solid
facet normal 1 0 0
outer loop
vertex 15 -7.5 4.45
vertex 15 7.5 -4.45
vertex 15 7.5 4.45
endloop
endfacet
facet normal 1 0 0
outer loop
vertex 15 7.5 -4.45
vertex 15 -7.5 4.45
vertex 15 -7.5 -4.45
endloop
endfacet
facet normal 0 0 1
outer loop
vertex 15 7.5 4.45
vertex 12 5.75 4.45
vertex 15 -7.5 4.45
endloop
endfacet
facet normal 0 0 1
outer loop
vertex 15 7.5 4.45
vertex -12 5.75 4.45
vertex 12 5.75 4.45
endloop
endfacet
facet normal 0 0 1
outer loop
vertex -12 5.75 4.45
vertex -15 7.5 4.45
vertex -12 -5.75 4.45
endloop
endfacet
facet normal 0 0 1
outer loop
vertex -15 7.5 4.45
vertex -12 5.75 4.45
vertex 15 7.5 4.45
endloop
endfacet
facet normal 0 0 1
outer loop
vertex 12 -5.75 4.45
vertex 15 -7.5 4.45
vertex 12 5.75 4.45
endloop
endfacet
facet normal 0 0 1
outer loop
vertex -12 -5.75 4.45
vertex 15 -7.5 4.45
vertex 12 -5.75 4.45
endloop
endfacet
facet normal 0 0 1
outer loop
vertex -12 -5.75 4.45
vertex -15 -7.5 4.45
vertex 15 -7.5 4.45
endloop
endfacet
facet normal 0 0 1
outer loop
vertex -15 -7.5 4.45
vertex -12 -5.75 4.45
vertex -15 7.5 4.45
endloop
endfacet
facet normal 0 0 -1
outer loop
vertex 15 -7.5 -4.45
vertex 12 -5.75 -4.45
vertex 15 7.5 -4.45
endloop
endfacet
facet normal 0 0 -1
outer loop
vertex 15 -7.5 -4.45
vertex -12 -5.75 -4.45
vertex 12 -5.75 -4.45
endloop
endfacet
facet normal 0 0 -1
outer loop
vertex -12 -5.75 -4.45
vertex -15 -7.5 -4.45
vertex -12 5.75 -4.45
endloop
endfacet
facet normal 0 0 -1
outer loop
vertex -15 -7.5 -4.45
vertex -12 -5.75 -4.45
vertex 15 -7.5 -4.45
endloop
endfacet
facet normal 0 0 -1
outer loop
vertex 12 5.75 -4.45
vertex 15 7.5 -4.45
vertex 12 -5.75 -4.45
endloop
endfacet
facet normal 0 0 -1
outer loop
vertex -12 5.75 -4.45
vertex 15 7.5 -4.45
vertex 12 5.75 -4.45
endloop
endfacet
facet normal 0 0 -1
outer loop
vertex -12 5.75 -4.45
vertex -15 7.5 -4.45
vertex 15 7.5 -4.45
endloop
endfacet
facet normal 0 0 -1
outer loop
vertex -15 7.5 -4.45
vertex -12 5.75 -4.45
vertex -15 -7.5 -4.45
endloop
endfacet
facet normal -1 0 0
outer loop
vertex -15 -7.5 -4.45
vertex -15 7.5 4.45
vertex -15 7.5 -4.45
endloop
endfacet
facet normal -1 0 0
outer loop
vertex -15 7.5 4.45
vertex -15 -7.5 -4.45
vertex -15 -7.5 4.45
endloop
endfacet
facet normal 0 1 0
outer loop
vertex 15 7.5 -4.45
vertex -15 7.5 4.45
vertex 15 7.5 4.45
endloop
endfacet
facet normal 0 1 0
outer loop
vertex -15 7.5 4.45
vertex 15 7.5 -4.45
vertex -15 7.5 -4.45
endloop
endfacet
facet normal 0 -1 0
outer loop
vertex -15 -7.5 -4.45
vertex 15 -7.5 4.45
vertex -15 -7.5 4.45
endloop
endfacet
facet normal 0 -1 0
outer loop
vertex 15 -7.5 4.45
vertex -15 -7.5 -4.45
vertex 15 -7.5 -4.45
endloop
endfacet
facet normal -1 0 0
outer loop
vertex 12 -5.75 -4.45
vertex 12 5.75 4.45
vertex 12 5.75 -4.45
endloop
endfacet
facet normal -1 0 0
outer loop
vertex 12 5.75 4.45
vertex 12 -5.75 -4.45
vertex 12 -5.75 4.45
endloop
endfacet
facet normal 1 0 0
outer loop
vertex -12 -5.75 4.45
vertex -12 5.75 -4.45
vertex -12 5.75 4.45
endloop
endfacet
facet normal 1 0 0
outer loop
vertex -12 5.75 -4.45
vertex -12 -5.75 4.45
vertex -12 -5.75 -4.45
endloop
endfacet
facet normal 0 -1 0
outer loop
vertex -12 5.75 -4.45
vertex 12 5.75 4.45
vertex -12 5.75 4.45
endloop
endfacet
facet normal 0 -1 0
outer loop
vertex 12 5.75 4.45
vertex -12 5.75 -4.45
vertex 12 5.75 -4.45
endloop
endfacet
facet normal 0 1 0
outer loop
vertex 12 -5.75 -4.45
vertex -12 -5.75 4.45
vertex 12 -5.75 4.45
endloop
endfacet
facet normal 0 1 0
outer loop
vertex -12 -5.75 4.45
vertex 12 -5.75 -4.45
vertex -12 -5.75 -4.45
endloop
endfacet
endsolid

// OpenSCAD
difference() {
    translate([0,0,0]) cube([30,15,9-0.1], center=true);
    cube([24,11.5,9], center=true);
}
